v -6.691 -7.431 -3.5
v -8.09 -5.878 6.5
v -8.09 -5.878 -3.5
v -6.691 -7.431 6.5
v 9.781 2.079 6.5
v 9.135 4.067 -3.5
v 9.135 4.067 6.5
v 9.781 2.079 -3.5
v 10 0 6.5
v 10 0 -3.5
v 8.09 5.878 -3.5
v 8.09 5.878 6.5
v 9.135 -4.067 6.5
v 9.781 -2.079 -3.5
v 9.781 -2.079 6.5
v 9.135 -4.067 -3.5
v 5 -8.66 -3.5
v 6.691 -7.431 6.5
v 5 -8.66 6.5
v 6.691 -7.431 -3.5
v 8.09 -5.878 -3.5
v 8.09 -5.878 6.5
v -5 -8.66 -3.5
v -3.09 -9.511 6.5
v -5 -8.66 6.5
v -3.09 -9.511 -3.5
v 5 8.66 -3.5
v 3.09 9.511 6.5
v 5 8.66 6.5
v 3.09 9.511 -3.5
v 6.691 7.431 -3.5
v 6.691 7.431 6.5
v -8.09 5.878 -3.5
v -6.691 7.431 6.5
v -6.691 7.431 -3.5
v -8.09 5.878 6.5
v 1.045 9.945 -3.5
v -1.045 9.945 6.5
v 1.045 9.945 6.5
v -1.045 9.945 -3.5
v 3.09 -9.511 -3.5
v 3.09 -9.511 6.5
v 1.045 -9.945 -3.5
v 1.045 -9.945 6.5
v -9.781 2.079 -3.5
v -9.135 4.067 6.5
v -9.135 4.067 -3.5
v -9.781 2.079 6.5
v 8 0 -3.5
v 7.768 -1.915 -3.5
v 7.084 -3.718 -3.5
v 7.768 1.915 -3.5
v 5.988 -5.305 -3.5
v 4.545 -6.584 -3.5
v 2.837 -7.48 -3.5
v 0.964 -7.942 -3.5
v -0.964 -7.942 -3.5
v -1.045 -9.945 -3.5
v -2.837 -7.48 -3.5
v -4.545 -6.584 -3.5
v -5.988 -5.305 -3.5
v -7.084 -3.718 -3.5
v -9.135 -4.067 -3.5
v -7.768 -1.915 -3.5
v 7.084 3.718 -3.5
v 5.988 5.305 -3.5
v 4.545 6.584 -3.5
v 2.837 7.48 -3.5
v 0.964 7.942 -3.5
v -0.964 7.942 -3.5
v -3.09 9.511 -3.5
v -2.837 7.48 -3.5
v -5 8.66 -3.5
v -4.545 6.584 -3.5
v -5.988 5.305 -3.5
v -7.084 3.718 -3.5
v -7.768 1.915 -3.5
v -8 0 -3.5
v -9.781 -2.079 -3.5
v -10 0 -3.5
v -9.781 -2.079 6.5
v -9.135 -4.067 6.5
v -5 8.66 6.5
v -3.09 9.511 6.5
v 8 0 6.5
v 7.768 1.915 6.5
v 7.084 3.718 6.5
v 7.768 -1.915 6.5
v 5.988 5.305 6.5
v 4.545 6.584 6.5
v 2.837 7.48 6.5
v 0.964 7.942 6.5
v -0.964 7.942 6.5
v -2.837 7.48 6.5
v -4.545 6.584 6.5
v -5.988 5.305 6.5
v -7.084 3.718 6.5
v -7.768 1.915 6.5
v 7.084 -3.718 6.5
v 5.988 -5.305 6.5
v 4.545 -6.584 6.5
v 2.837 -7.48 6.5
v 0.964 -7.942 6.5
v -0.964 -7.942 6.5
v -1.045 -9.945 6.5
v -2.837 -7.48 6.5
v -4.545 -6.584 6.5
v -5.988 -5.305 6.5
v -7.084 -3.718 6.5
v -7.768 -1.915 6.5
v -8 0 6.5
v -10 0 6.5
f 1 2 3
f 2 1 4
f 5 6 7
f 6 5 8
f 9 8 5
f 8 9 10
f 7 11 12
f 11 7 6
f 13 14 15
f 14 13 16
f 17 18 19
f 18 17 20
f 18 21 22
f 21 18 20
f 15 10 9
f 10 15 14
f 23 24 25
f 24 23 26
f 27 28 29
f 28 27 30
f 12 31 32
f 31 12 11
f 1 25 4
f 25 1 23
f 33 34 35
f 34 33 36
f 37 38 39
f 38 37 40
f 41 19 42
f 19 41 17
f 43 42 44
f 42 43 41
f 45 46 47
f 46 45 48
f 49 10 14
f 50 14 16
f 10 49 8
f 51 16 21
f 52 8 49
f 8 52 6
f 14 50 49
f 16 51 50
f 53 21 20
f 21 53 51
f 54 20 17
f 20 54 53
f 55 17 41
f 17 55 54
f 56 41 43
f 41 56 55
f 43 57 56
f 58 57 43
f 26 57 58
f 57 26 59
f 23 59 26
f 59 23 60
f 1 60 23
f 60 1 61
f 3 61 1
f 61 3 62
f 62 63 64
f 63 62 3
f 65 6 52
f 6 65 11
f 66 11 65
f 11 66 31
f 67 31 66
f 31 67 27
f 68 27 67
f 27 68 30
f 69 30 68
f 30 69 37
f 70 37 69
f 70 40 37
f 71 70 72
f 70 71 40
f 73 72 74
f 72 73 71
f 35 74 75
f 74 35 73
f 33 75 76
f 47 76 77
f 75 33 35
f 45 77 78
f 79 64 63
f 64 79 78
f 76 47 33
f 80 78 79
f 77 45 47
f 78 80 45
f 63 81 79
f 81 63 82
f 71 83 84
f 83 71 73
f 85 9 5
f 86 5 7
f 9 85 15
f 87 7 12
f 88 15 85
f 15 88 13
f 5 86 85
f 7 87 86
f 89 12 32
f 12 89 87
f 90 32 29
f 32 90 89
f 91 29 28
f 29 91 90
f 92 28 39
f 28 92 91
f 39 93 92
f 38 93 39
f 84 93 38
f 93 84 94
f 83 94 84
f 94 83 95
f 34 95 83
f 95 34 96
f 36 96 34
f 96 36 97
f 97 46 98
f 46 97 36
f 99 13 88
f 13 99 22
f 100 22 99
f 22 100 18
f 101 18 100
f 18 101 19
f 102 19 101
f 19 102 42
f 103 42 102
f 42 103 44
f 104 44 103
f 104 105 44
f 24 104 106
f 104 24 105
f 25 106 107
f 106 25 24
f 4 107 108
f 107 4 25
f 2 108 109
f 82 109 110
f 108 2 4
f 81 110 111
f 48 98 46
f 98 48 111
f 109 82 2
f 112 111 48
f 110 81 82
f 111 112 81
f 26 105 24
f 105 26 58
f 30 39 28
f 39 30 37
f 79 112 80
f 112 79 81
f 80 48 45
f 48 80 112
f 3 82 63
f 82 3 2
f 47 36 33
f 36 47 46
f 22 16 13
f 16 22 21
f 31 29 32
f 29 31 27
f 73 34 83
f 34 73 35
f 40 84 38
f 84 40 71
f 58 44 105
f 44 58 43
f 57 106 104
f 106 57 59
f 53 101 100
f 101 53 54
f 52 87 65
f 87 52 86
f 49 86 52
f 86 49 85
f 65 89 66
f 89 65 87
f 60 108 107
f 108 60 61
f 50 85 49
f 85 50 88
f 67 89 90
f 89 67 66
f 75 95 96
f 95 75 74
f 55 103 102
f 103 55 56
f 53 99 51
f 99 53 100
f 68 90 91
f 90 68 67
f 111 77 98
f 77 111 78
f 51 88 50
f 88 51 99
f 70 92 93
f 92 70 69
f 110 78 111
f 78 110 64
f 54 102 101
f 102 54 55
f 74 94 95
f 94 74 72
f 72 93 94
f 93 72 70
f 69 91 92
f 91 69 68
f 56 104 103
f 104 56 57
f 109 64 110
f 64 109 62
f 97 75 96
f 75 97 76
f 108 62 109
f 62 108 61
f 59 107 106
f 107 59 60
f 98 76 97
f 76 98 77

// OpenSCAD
gear_dxf_source="gg_gear.dxf";

sight_thickness=7;
sight_line_thickness=4;

//rail;



total_width = dxf_dim(file = gear_dxf_source, name = "total_width"); 
total_height = dxf_dim(file = gear_dxf_source, name = "total_height"); 
echo (total_width, total_height);

translate([0,-total_height,0])
	linear_extrude(height =7 , center = true, convexity = 10)
		import(file=gear_dxf_source, convexity=3);
		
	difference(){
		union(){	
			translate([0,0,-sight_thickness/2])
				cylinder(r=10, h=10);
			cube([sight_line_thickness,	total_width-40,7],center=true);
			cube([total_width-40 , sight_line_thickness, sight_thickness], center=true);
		}
		translate([0,0,-sight_thickness/2-0.5])
			cylinder(r=8, h=11);
	}
